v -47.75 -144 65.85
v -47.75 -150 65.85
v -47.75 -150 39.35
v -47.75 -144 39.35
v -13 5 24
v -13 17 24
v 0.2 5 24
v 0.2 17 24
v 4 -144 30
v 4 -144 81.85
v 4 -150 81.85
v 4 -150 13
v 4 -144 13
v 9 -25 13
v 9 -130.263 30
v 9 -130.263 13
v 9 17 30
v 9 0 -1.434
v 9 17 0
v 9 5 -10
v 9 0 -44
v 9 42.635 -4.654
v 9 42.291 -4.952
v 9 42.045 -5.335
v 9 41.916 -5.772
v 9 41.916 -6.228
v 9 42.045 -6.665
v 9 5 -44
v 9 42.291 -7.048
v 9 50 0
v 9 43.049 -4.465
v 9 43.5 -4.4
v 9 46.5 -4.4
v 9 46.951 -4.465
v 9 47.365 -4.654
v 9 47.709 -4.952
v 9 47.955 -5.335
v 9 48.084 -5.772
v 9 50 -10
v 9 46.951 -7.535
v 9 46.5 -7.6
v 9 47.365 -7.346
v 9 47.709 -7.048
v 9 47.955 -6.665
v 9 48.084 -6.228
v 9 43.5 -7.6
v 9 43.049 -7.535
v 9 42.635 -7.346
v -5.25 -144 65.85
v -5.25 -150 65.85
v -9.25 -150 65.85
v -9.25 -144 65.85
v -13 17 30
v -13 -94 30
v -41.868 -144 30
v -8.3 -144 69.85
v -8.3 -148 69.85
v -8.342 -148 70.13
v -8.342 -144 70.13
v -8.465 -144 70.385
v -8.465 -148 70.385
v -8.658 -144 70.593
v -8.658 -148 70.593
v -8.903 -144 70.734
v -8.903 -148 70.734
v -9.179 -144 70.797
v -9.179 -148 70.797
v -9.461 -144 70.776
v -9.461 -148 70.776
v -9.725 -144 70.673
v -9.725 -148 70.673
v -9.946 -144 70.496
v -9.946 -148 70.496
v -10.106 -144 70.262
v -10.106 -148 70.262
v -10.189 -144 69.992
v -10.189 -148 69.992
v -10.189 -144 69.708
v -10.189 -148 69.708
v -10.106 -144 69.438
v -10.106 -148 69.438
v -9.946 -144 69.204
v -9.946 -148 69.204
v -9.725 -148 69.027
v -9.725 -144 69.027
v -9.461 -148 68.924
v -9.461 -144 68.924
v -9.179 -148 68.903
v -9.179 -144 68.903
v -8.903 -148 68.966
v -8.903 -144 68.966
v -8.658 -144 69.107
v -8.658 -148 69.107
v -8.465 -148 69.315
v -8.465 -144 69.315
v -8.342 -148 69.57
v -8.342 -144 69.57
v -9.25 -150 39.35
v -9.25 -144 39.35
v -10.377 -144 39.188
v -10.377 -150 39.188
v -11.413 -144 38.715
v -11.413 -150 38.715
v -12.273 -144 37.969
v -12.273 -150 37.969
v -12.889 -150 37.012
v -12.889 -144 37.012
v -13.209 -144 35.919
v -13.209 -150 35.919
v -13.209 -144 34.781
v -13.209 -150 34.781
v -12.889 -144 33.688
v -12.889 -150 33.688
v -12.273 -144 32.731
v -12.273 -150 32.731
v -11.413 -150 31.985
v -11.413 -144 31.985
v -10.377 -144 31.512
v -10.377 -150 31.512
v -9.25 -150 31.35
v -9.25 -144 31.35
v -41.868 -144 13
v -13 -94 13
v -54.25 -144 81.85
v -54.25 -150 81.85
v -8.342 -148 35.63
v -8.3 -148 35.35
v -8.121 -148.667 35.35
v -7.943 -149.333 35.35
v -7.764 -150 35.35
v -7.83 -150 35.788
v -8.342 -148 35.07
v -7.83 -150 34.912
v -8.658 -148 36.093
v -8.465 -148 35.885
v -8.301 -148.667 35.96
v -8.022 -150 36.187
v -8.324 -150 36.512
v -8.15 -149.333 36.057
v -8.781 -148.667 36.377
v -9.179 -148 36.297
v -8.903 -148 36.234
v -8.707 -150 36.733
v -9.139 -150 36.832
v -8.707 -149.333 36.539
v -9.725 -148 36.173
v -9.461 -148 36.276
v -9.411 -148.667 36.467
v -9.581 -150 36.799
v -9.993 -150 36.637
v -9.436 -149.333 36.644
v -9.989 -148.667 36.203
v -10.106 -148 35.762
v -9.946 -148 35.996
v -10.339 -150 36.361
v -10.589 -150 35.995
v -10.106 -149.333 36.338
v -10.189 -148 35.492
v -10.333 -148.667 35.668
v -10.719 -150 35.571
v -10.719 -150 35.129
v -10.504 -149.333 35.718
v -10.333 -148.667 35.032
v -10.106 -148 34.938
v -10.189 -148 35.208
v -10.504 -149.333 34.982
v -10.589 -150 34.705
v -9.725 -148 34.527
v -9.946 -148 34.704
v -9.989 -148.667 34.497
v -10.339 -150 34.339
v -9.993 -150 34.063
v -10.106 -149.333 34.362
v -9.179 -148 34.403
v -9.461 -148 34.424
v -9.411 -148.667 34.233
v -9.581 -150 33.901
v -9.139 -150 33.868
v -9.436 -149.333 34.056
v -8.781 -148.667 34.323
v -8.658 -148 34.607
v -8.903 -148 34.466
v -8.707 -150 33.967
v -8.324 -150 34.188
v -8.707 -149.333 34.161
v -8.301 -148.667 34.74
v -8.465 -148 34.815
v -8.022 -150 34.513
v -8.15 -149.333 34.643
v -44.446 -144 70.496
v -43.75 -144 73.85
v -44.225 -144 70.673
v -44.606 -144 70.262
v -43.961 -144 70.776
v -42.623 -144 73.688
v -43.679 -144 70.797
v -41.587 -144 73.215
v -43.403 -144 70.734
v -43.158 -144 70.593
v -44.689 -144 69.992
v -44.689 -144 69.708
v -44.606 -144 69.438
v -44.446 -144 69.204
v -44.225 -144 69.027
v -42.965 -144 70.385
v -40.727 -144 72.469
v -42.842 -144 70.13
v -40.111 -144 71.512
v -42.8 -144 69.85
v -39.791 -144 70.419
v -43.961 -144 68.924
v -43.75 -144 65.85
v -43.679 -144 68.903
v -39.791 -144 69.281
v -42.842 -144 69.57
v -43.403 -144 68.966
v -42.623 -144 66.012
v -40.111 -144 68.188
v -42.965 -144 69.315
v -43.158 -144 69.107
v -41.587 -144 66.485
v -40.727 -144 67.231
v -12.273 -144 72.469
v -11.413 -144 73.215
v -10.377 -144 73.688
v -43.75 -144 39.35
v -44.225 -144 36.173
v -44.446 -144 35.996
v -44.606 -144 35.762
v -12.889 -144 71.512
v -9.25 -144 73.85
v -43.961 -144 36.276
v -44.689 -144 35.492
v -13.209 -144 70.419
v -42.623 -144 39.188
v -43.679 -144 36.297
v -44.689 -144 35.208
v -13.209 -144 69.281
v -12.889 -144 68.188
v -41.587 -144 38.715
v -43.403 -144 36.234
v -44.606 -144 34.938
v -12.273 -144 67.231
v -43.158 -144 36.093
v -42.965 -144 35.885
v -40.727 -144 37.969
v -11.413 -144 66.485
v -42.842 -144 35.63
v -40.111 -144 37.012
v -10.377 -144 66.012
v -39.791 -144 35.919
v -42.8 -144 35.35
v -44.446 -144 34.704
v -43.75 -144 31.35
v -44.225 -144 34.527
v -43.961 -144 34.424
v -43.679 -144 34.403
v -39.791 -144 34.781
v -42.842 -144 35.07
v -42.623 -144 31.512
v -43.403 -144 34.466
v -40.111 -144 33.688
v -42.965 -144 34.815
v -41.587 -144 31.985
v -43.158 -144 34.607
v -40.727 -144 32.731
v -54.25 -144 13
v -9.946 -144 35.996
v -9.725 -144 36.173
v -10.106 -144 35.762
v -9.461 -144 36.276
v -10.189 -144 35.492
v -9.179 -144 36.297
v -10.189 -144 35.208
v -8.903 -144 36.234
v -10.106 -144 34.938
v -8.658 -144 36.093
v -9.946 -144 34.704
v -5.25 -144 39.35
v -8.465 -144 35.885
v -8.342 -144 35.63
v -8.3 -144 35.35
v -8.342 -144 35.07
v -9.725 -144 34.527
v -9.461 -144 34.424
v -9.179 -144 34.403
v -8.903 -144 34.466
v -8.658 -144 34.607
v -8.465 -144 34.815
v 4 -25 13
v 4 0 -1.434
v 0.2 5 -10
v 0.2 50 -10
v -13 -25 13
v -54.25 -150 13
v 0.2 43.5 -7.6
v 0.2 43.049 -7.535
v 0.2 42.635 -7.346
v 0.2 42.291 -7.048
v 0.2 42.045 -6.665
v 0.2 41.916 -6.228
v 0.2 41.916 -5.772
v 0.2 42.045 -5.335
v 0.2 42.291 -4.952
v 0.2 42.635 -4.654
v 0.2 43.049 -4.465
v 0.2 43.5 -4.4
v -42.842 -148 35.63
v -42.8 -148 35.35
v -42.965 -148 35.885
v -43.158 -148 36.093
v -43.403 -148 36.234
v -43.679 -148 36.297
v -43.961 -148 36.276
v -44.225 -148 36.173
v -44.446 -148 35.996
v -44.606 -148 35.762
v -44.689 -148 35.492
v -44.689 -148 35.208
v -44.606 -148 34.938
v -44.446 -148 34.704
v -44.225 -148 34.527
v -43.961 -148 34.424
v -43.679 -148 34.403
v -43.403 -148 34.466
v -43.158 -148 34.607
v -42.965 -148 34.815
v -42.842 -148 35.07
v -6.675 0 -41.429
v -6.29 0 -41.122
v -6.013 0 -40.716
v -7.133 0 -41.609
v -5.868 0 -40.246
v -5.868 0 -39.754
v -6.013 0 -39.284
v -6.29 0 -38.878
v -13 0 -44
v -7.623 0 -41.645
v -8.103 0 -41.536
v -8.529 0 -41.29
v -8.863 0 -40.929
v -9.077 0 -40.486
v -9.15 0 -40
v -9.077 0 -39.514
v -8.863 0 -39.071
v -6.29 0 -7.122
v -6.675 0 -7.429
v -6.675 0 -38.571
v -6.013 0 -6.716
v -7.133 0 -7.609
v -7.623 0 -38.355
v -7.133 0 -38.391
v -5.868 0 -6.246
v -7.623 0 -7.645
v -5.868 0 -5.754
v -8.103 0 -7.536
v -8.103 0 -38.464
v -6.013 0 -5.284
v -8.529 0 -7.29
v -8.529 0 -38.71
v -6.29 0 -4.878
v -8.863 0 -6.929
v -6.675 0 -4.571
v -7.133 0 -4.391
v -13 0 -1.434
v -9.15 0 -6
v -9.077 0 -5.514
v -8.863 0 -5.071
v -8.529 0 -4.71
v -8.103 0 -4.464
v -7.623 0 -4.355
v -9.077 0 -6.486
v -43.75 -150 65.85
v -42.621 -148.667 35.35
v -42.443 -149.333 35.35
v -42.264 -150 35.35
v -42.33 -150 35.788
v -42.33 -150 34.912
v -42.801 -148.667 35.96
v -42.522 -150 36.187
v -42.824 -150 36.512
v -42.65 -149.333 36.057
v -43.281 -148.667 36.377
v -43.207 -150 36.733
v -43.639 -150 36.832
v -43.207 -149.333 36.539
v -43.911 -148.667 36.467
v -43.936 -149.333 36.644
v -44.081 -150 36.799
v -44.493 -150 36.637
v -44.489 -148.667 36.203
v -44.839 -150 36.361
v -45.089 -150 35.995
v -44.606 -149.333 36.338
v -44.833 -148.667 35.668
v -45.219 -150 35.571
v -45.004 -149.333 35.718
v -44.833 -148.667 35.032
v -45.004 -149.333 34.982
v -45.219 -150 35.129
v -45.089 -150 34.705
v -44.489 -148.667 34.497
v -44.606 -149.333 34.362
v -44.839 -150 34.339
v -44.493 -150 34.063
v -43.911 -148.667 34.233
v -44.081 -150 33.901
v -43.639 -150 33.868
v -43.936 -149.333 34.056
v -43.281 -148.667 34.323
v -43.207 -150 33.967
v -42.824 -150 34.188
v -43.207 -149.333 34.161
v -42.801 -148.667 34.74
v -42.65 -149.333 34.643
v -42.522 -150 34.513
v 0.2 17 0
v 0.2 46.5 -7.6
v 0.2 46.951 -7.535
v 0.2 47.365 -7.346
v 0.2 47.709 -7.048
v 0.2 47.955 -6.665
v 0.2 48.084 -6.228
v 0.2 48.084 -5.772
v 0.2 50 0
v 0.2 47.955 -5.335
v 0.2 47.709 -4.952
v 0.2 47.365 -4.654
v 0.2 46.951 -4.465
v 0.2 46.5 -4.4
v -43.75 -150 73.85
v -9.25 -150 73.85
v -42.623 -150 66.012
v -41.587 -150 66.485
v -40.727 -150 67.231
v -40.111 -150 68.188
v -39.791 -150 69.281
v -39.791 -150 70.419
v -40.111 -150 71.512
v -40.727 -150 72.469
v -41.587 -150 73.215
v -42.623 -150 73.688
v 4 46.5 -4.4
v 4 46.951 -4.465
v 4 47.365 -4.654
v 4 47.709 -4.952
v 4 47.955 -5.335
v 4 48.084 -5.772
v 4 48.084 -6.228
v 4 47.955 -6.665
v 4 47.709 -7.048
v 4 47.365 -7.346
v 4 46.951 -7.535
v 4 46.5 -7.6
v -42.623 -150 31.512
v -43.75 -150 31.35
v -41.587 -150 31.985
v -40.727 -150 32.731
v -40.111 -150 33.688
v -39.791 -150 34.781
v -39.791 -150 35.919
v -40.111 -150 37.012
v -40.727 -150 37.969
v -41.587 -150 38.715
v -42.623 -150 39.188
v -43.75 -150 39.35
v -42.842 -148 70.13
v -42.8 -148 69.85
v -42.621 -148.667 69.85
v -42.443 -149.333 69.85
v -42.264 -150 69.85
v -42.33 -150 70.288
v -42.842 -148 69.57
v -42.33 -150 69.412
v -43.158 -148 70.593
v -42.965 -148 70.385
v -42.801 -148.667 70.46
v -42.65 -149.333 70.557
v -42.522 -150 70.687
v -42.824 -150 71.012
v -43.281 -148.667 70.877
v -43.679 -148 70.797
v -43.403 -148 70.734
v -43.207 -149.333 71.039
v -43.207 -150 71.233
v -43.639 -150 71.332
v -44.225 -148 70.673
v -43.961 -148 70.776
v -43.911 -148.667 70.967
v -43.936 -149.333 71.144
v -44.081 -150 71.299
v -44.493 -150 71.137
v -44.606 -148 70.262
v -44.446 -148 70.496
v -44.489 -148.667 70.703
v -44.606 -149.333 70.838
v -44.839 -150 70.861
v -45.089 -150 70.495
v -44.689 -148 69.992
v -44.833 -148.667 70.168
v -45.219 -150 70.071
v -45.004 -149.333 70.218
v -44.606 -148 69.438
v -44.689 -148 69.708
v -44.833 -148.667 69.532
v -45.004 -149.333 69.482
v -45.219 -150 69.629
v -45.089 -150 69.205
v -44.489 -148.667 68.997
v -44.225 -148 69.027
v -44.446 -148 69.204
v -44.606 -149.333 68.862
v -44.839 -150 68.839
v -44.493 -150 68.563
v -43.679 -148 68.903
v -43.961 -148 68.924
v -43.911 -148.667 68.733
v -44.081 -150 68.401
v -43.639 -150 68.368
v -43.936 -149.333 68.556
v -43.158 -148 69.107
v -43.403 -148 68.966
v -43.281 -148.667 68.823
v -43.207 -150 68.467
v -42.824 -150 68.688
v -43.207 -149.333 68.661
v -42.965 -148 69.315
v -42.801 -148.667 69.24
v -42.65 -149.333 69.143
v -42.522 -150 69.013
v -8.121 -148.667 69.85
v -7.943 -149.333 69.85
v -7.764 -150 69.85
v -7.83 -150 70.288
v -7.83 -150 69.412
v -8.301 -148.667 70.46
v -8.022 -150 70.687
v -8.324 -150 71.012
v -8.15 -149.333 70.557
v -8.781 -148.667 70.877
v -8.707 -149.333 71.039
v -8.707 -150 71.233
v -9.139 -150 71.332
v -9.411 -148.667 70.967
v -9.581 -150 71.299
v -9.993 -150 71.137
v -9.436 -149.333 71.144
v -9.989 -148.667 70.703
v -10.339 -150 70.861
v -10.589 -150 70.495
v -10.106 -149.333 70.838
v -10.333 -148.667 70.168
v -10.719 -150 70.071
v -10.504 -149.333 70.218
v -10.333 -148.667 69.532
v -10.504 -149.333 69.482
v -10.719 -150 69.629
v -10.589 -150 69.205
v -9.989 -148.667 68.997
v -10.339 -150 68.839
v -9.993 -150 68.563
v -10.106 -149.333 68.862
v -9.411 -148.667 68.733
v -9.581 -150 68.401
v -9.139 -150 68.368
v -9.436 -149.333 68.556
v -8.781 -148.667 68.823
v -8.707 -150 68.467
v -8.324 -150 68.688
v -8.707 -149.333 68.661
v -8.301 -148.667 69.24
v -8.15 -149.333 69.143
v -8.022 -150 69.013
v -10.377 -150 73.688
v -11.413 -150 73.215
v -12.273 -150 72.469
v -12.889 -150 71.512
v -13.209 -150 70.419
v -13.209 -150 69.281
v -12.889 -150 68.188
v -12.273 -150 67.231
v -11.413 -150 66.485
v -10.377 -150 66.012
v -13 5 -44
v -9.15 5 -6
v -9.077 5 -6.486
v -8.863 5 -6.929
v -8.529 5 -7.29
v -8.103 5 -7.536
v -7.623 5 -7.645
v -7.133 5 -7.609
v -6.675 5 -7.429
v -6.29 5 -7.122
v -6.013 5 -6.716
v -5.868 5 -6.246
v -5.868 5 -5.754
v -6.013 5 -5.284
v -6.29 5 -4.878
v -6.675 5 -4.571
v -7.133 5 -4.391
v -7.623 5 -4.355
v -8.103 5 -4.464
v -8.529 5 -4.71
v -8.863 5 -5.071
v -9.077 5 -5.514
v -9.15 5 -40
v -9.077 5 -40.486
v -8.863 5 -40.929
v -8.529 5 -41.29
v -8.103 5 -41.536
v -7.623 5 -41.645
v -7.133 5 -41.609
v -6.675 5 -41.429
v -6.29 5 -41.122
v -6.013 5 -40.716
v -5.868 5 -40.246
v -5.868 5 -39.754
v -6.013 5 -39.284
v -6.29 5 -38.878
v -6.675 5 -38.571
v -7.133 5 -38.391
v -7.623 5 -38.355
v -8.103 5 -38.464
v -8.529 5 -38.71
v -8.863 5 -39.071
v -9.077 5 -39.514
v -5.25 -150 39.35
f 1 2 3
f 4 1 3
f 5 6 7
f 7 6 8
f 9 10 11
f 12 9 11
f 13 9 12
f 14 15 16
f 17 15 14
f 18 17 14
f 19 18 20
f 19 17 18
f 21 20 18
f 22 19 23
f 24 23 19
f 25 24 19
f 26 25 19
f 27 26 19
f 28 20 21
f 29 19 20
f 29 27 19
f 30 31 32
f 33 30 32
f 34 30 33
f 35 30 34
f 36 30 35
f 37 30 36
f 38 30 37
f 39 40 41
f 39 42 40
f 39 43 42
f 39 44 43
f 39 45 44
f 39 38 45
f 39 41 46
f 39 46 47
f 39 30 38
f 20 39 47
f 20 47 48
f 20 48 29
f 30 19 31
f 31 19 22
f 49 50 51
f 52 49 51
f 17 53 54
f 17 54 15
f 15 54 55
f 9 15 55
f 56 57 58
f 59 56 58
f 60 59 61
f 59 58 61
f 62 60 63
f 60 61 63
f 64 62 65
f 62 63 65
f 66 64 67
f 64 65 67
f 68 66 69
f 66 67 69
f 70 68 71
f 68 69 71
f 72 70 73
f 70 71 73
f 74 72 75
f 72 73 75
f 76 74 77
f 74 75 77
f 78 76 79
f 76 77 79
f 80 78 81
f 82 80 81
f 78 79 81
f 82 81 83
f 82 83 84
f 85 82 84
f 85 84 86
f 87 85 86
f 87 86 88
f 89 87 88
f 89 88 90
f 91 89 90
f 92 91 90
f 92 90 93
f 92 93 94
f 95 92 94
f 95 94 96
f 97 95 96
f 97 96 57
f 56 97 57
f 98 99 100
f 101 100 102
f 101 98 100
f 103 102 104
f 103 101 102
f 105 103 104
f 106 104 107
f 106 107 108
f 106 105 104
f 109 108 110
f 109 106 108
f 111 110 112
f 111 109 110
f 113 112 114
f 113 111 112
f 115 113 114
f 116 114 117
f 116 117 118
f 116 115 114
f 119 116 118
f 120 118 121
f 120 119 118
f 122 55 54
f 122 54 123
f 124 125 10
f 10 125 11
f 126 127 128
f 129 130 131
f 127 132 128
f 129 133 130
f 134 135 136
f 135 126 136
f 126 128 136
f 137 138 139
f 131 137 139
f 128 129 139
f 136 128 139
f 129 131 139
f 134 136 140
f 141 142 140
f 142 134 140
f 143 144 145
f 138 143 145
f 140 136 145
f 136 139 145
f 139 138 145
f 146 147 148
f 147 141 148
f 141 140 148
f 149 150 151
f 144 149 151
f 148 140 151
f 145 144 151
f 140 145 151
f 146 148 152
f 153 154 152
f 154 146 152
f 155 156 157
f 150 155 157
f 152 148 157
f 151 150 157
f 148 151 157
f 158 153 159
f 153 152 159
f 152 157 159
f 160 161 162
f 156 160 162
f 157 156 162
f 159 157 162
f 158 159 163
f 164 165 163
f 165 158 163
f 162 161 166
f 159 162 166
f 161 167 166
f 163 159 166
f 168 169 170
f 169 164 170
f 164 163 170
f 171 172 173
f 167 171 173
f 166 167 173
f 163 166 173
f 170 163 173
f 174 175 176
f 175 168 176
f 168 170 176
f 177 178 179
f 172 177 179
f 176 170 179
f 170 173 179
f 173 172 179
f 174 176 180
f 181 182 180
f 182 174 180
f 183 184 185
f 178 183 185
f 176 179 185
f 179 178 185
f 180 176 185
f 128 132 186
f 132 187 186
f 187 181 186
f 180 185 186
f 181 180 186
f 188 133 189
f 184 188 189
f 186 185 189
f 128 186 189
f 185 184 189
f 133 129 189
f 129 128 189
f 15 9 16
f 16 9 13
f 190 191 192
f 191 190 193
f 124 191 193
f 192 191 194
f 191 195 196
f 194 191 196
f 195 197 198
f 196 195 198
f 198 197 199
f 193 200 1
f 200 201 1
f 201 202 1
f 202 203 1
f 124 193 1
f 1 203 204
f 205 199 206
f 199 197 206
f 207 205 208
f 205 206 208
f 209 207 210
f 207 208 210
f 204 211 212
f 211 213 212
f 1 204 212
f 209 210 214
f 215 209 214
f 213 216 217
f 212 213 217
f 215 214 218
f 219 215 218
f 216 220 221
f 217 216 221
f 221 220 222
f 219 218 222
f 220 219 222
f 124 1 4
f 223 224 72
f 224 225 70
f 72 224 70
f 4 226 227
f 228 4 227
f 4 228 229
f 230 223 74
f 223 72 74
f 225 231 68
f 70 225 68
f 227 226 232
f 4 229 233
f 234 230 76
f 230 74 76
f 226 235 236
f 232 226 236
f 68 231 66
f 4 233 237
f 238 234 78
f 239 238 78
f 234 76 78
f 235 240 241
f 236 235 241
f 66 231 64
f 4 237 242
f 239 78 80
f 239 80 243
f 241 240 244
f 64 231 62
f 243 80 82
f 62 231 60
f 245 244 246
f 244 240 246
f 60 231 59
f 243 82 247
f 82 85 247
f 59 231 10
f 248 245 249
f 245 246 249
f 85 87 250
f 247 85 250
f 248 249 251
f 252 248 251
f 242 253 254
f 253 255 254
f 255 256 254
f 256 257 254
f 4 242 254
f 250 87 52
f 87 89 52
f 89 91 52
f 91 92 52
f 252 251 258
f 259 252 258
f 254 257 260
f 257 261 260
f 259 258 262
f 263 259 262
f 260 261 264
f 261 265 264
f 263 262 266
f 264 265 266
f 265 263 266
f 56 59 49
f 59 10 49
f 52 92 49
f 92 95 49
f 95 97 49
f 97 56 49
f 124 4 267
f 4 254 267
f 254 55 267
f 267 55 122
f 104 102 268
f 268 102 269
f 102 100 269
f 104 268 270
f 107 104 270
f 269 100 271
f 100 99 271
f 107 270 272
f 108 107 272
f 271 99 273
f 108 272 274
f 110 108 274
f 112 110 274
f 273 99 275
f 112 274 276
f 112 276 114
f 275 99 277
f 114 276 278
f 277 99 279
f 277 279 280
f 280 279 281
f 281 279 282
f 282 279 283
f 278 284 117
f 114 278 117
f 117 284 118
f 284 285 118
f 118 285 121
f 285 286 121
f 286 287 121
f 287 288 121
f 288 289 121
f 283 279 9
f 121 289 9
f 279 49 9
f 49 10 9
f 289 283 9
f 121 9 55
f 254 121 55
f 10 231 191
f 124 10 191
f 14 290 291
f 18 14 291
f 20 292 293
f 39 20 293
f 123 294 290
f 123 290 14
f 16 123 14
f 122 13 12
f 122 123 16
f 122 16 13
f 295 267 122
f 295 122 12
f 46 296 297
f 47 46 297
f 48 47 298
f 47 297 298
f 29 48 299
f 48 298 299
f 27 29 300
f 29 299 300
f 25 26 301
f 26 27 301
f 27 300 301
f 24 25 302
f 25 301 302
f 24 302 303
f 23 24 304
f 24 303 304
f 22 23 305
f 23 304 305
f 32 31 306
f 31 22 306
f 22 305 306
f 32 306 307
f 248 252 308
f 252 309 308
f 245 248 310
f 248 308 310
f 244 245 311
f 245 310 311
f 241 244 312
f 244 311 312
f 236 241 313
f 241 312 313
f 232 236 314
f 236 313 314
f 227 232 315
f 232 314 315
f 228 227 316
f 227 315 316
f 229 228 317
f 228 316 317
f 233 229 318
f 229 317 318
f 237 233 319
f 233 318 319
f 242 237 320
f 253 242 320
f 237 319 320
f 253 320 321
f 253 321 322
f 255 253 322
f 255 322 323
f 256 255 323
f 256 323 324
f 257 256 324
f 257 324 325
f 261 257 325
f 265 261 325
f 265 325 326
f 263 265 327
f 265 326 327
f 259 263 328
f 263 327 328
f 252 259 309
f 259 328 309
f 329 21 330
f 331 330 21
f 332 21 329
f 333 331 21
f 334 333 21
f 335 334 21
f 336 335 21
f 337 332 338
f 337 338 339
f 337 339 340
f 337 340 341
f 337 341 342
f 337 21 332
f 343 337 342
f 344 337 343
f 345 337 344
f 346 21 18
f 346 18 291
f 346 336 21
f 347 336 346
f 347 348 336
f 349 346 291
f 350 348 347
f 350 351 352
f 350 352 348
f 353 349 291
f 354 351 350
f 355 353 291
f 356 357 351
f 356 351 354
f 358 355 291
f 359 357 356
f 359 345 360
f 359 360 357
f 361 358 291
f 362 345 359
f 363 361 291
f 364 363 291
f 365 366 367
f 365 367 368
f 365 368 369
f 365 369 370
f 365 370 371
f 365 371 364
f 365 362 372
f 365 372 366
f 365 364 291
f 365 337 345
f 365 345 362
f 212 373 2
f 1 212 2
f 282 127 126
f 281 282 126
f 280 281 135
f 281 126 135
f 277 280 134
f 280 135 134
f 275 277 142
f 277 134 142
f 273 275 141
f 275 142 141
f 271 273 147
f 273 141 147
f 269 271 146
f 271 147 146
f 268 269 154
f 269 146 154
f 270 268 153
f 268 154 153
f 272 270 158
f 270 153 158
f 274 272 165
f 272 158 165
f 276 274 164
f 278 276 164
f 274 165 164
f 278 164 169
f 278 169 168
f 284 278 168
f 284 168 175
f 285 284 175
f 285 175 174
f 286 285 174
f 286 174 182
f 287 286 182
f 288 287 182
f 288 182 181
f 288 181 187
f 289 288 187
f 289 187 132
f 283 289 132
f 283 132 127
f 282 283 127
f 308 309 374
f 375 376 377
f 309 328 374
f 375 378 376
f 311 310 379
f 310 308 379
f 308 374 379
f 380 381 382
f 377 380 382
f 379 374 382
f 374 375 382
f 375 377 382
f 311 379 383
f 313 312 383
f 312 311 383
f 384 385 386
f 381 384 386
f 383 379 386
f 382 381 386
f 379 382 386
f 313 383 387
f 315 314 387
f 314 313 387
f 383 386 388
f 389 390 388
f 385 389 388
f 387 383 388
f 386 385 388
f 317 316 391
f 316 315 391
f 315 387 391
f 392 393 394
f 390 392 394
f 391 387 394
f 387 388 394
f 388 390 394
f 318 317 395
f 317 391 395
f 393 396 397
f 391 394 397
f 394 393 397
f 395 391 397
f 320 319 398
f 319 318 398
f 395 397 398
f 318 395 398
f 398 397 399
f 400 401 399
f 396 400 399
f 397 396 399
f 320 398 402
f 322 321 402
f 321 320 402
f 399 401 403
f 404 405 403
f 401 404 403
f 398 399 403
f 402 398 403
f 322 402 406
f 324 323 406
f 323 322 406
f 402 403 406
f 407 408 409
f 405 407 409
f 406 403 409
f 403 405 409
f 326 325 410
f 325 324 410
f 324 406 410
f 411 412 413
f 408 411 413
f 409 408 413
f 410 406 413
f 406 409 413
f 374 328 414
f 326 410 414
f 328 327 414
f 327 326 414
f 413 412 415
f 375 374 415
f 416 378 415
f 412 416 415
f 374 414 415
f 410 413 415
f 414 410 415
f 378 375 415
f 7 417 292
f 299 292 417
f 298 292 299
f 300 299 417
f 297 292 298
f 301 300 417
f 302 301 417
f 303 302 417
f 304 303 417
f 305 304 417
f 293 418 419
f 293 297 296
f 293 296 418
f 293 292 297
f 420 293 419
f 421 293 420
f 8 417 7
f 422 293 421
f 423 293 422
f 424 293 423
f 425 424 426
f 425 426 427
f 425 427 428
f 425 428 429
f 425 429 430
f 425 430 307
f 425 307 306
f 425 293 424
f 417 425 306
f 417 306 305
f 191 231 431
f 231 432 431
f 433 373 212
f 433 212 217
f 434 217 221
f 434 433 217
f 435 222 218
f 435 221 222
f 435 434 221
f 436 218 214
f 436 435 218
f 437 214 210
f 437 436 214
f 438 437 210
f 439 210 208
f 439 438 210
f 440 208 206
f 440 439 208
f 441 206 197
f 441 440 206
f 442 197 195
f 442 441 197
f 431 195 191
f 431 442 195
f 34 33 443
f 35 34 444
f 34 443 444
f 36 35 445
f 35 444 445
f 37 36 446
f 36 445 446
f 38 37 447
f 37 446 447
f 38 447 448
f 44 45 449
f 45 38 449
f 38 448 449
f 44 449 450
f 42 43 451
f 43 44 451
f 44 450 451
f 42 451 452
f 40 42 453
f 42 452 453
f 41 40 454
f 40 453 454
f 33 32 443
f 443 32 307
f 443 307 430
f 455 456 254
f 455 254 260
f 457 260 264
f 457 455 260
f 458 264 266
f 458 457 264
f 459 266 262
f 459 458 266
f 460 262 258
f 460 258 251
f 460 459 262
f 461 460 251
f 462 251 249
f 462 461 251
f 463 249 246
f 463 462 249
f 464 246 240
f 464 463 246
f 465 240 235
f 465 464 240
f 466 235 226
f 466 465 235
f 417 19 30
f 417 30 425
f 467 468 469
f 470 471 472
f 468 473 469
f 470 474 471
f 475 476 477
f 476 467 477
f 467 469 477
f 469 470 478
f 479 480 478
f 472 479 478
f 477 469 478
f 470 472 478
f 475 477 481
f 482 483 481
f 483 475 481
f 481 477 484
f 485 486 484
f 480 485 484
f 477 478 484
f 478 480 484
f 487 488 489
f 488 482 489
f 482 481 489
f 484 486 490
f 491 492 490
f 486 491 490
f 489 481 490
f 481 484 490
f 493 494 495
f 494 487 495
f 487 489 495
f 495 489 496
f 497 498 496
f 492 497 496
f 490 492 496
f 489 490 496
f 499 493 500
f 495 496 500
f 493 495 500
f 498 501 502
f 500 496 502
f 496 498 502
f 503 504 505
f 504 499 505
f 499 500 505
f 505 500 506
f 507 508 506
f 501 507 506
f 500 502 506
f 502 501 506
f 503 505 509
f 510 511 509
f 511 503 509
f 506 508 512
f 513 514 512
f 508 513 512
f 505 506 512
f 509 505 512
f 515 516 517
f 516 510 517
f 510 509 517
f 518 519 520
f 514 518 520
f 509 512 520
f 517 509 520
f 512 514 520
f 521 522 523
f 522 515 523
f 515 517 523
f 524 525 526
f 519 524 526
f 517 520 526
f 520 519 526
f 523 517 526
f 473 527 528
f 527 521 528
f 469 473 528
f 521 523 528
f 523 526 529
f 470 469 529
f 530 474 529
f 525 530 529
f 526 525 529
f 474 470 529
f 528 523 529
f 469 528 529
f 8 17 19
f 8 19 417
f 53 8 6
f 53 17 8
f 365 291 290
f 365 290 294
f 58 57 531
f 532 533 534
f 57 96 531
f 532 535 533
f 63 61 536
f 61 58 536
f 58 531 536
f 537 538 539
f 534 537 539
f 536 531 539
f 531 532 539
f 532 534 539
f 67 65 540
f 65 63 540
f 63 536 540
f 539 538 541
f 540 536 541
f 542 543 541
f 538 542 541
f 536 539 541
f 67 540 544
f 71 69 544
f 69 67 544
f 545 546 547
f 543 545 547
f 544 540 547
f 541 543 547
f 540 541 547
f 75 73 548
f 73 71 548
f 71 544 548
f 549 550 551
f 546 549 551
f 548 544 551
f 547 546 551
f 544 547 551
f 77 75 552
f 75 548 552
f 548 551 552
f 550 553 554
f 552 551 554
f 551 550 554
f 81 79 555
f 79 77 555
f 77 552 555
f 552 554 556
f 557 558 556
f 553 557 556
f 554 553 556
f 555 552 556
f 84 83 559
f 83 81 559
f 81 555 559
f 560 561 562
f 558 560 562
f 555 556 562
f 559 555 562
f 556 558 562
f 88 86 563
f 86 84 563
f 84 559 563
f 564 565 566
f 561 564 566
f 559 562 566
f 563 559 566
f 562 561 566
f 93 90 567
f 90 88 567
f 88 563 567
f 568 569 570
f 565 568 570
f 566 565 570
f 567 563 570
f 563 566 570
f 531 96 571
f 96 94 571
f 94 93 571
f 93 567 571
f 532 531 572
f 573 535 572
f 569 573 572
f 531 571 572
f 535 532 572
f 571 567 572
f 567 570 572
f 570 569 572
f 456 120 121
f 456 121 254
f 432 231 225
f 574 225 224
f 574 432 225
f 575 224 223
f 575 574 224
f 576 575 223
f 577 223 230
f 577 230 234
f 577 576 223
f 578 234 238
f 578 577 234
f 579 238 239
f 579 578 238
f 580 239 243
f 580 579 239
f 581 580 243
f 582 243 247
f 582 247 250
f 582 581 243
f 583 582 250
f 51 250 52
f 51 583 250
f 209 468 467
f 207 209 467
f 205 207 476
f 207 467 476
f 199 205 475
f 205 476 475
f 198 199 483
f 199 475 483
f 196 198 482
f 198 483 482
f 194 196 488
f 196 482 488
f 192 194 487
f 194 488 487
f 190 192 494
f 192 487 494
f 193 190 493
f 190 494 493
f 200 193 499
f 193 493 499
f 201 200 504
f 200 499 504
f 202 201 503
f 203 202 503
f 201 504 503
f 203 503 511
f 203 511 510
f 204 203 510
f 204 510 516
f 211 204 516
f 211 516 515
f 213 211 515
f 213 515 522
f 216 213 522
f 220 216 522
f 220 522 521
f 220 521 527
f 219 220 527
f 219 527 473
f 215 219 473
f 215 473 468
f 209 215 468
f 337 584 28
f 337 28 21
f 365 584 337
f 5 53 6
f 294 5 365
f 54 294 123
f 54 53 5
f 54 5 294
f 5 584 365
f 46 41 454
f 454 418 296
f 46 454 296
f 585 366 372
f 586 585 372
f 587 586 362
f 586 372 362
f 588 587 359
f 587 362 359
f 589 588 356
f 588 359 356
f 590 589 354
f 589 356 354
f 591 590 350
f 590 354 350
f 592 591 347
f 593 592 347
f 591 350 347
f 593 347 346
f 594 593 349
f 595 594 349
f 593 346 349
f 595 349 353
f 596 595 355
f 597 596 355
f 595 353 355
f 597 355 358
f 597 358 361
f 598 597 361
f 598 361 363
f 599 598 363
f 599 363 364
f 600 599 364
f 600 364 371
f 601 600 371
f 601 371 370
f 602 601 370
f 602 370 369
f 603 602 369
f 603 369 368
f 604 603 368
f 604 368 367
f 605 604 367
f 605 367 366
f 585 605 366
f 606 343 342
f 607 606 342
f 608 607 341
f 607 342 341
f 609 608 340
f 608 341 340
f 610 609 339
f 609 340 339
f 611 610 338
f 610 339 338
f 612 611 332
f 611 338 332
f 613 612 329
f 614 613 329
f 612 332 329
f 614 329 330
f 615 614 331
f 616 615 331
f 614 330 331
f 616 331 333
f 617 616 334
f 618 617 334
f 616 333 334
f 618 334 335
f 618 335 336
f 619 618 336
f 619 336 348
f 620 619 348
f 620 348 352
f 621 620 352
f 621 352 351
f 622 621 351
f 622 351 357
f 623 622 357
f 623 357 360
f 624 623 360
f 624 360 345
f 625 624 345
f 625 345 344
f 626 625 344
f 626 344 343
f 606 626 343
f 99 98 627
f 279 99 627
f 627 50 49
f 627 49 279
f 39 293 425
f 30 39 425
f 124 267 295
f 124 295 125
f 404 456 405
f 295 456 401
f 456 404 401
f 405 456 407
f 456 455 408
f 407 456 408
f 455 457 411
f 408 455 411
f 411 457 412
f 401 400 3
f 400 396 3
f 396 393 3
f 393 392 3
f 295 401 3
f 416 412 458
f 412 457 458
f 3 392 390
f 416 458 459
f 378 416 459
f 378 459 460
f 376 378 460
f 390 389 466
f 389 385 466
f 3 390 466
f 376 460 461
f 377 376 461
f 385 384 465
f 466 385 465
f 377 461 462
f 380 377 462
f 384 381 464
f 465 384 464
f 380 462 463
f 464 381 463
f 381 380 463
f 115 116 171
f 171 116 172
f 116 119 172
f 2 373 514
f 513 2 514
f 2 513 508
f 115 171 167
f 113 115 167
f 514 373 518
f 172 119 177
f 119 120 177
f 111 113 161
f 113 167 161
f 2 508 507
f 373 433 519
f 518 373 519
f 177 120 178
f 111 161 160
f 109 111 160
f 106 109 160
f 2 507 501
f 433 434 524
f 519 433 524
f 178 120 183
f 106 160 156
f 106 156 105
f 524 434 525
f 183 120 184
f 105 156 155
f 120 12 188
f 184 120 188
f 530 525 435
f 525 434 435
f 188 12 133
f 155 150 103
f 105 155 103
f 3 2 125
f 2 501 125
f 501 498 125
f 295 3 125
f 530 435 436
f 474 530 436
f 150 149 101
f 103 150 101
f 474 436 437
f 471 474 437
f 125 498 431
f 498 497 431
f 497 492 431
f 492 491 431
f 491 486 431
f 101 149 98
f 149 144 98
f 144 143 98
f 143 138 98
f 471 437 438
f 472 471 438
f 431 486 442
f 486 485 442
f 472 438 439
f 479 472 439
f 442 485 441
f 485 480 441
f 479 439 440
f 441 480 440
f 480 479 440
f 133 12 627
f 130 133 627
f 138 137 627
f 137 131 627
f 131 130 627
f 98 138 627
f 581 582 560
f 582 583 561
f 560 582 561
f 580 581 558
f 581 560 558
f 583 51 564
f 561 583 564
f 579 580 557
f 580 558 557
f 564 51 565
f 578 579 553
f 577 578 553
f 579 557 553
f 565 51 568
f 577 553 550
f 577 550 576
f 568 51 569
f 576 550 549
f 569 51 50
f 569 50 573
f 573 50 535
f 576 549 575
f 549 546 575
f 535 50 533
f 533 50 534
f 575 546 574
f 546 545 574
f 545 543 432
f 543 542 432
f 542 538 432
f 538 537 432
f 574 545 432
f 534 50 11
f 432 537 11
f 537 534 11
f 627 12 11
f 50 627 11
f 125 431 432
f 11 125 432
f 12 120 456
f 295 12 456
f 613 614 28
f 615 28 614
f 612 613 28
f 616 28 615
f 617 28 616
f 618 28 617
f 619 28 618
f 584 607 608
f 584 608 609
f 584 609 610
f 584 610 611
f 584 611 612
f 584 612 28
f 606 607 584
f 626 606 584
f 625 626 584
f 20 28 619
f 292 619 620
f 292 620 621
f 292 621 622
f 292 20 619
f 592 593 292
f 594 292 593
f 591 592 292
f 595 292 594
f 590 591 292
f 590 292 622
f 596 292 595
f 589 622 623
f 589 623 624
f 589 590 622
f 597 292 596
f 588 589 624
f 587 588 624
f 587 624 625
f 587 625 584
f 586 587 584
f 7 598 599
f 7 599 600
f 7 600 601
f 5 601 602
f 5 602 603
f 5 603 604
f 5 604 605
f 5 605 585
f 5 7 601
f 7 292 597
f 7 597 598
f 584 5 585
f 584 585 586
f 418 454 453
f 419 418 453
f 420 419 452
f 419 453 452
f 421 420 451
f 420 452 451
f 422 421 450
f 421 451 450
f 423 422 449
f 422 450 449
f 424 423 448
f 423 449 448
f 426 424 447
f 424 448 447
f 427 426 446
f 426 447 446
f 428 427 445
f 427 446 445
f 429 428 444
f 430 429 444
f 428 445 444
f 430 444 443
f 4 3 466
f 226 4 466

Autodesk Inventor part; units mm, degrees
ref_plane "YZ Plane" through (0, 0, 0) normal (1, 0, 0) x (0, 1, 0)
ref_plane "XZ Plane" through (0, 0, 0) normal (0, 1, 0) x (-1, 0, 0)
ref_plane "XY Plane" through (0, 0, 0) normal (0, 0, 1) x (1, 0, 0)
sketch "Sketch1" plane through (0, 0, 0) normal (0, 1, 0) x (-1, 0, 0)
  line L0 (0, 0) -> (13, 0)
  line L1 (13, 0) -> (13, -44)
  line L2 (13, -44) -> (0, -44)
  line L3 (0, -44) -> (0, 0)
  line L4 (13, 0) -> (13, -6)
  line L5 (13, -6) -> (7.5, -6)
  line L6 (7.5, -6) -> (7.5, -40)
  circle A0 centre (7.5, -6) radius 1.65
  circle A1 centre (7.5, -40) radius 1.65
  dimension "d0" = 13
  dimension "d1" = 44
  dimension "d2" = 6
  dimension "d3" = 5.5
  dimension "d4" = 34
  dimension "d5" = 3.3
  dimension "d6" = 3.3
extrude "Extrusion1" add sketch "Sketch1" along normal blind 5
sketch "Sketch2" plane through (0, 0, 0) normal (1, 0, 0) x (0, 0, -1)
  line L0 (0, 5) -> (44, 5) projected
  line L1 (0, 5) -> (44, 5)
  line L2 (44, 5) -> (44, 50)
  line L3 (44, 50) -> (0, 50)
  line L4 (0, 50) -> (0, 5)
  line L5 (0, 0) -> (44, 0)
  line L6 (44, 0) -> (44, 5)
  line L7 (44, 5) -> (0, 5)
  line L8 (0, 5) -> (0, 0)
  line L9 (0, 50) -> (10, 50)
  line L10 (10, 50) -> (10, 5)
  line L11 (10, 5) -> (0, 5)
  line L12 (0, 5) -> (0, 50)
  dimension "d9" = 44
  dimension "d10" = 45
  dimension "d11" = 10
extrude "Extrusion2" add sketch "Sketch2" along normal blind 4 contours L4 L3 L10 L0 | L0 L6 L5 L8
sketch "Sketch3" plane through (4, 0, 0) normal (1, 0, 0) x (0, 0, -1)
  line L0 (44, 5) -> (10, 5) projected
  line L1 (10, 5) -> (10, 45)
  line L2 (10, 5) -> (10, 50) projected
  line L3 (0, 50) -> (0, 5) projected
  line L4 (0, 45) -> (4.4, 45)
  line L5 (6, 45) -> (6, 46.5)
  line L6 (6, 45) -> (6, 43.5)
  line L7 (4.4, 46.5) -> (4.4, 43.5)
  line L8 (7.6, 46.5) -> (7.6, 43.5)
  arc A0 (5.4432, 45) -> (6, 44.9) centre (6, 46.5) ccw
  arc A1 (6.5568, 45) -> (4.4, 46.5) centre (6, 46.5) ccw
  line L9 (10, 45) -> (6.5568, 45)
  line L10 (5.4432, 45) -> (0, 45)
  arc A2 (6, 45.1) -> (5.4432, 45) centre (6, 43.5) ccw
  arc A3 (4.4, 43.5) -> (7.6, 43.5) centre (6, 43.5) ccw
  point P0 (0, 0)
  dimension "d14" = 40
  dimension "d15" = 6
  dimension "d16" = 1.5
  dimension "d17" = 1.5
extrude "Extrusion3" cut sketch "Sketch3" against normal blind 4 contours L6 A0 A2 L5 | A1 L9 L8 A3 L7 | L8 L9 A1
sketch "Sketch4" plane through (-13, 0, 0) normal (0, 0, 1) x (1, 0, 0)
  line L0 (0, 0) -> (17, 0) projected
  line L1 (17, 0) -> (17, 5) projected
  line L2 (0, 0) -> (17, 0)
  line L3 (17, 0) -> (17, 5)
  line L4 (17, 5) -> (0, 5)
  line L5 (0, 5) -> (0, 0)
  line L6 (13, 50) -> (13, 5) projected
  line L7 (17, 0) -> (13, 0)
  line L8 (13, 0) -> (13, 17)
  line L9 (13, 17) -> (17, 17)
  line L10 (17, 17) -> (17, 0)
  dimension "d22" = 17
extrude "Extrusion4" add sketch "Sketch4" along normal blind 30
sketch "Sketch5" plane through (0, 0, 0) normal (0, -1, 0) x (1, 0, 0)
  line L0 (-13, -44) -> (-13, 30) projected
  line L1 (-13, 30) -> (4, 30)
  line L2 (4, 30) -> (4, 13)
  line L3 (4, 13) -> (-13, 13)
  line L4 (-13, 13) -> (-13, 30)
  point P0 (0, 0)
  dimension "d25" = 17
  dimension "d26" = 17
extrude "Extrusion5" add sketch "Sketch5" along normal blind 150
sketch "Sketch7" plane through (0, -150, 0) normal (0, -1, 0) x (1, 0, 0)
  line L0 (4, 13) -> (-13, 13) projected
  line L1 (0, 30) -> (0, -10) projected
  line L2 (0, 13) -> (0, 30)
  line L3 (0, 30) -> (0, 52.6)
  circle A0 centre (-36, 52.6) radius 9
  line L4 (-36, 52.6) -> (-36, 36.6)
  line L5 (-36, 36.6) -> (-20, 36.6)
  line L6 (-36, 52.6) -> (-36, 68.6)
  line L7 (-36, 68.6) -> (-52, 68.6)
  line L8 (-52, 68.6) -> (-20, 68.6)
  line L9 (-20, 68.6) -> (-20, 36.6)
  line L10 (-20, 36.6) -> (-52, 36.6)
  line L11 (-52, 36.6) -> (-52, 68.6)
  circle A1 centre (-20, 68.6) radius 1.1
  circle A2 centre (-20, 36.6) radius 1.1
  circle A3 centre (-52, 36.6) radius 1.1
  circle A4 centre (-52, 68.6) radius 1.1
  circle A5 centre (-20, 68.6) radius 4
  circle A6 centre (-20, 36.6) radius 4
  line L12 (-52, 65.6) -> (-52, 70.6)
  line L13 (-52, 36.6) -> (-52, 42.6)
  circle A7 centre (-52, 68.6) radius 4
  circle A8 centre (-52, 36.6) radius 4
  point P0 (0, 0)
  point P1 (-20, 64.6)
  point P2 (-20, 40.6)
  dimension "d29" = 22.6
  dimension "d31" = 18
  dimension "d32" = 16
  dimension "d33" = 16
  dimension "d34" = 16
  dimension "d35" = 16
  dimension "d36" = 2.2
  dimension "d37" = 2.2
  dimension "d39" = 2.2
  dimension "d40" = 8
  dimension "d43" = 8
  dimension "d49" = 8
  dimension "d50" = 8
sketch "Sketch14" plane through (0, -150, 0) normal (0, -1, 0) x (1, 0, 0)
  line L0 (4, 13) -> (4, 30) projected
  line L1 (4, 13) -> (4, 52.6)
  line L2 (4, 52.6) -> (-26.5, 52.6)
  line L3 (-26.5, 52.6) -> (-26.5, 35.35)
  line L4 (-26.5, 35.35) -> (-9.25, 35.35)
  line L5 (-26.5, 52.6) -> (-43.75, 52.6)
  line L6 (-43.75, 52.6) -> (-43.75, 69.85)
  line L7 (-43.75, 69.85) -> (-9.25, 69.85)
  line L8 (-9.25, 69.85) -> (-9.25, 35.35)
  line L9 (-9.25, 35.35) -> (-43.75, 35.35)
  line L10 (-43.75, 35.35) -> (-43.75, 69.85)
  circle A0 centre (-43.75, 69.85) radius 0.95
  circle A1 centre (-9.25, 69.85) radius 0.95
  circle A2 centre (-9.25, 35.35) radius 0.95
  circle A3 centre (-43.75, 35.35) radius 0.95
  circle A4 centre (-43.75, 69.85) radius 4
  circle A5 centre (-9.25, 69.85) radius 4
  circle A6 centre (-9.25, 35.35) radius 4
  circle A7 centre (-43.75, 35.35) radius 4
  point P0 (0, 0)
  dimension "d91" = 39.6
  dimension "d92" = 30.5
  dimension "d93" = 17.25
  dimension "d94" = 17.25
  dimension "d95" = 17.25
  dimension "d96" = 17.25
  dimension "d97" = 1.9
  dimension "d98" = 1.9
  dimension "d99" = 1.9
  dimension "d100" = 1.9
  dimension "d101" = 8
  dimension "d102" = 8
  dimension "d103" = 8
  dimension "d104" = 8
extrude "Extrusion14" add sketch "Sketch14" against normal blind 6 contours A5 L7 A1 L8 | L8 A1 L7 A5 | A6 L4 A2 L8 | L8 A2 L4 A6 | A7 L10 A3 L9 | L9 A3 L10 A7 | A4 L7 A0 L6 | L6 A0 L7 A4
sketch "Sketch15" plane through (-9.25, -150, 69.85) normal (0, -1, 0) x (1, 0, 0)
  circle A0 centre (0, 0) radius 4 projected
  line L0 (0, 4) -> (10, 4)
  line L1 (10, 4) -> (10, -4)
  line L2 (10, -4) -> (0, -4)
  line L3 (0, -4) -> (0, 4)
  circle A1 centre (0, -34.5) radius 4 projected
  line L4 (0, -30.5) -> (10, -30.5)
  line L5 (10, -30.5) -> (10, -38.5)
  line L6 (10, -38.5) -> (0, -38.5)
  line L7 (0, -38.5) -> (0, -30.5)
  circle A2 centre (-34.5, -34.5) radius 4 projected
  line L8 (-34.5, -38.5) -> (-44.5, -38.5)
  line L9 (-44.5, -38.5) -> (-44.5, -30.5)
  line L10 (-44.5, -30.5) -> (-34.5, -30.5)
  line L11 (-34.5, -30.5) -> (-34.5, -38.5)
  circle A3 centre (-34.5, 0) radius 4 projected
  line L12 (-34.5, -4) -> (-44.5, -4)
  line L13 (-44.5, -4) -> (-44.5, 4)
  line L14 (-44.5, 4) -> (-34.5, 4)
  line L15 (-34.5, 4) -> (-34.5, -4)
  line L16 (-44.5, 4) -> (-38.5, 4)
  line L17 (-38.5, 4) -> (-38.5, -38.5)
  line L18 (-38.5, -38.5) -> (-44.5, -38.5)
  line L19 (-44.5, -38.5) -> (-44.5, 4)
  line L20 (10, 4) -> (4, 4)
  line L21 (4, 4) -> (4, -38.5)
  line L22 (4, -38.5) -> (10, -38.5)
  line L23 (10, -38.5) -> (10, 4)
  point P0 (9.25, -69.85)
  point P1 (-38.5, -4)
  point P2 (-34.5, 4)
  point P3 (-34.5, -30.5)
  point P4 (-38.5, -30.5)
  point P5 (0, -4)
  point P6 (4, -4)
  point P7 (4, -30.5)
  point P8 (0, -38.5)
  point P9 (10, -4)
  dimension "d107" = 10
  dimension "d108" = 8
  dimension "d109" = 10
  dimension "d110" = 8
  dimension "d111" = 10
  dimension "d112" = 8
  dimension "d113" = 10
  dimension "d114" = 8
  dimension "d115" = 6
  dimension "d116" = 6
extrude "Extrusion15" add sketch "Sketch15" against normal blind 6 contours L21 L2 A0 | A0 L0 L21 | L21 L0 L1 L2 | L2 L23 L4 L21 | L21 A1 L4 | L4 L5 L6 L21 | L21 L6 A1 | A2 L17 L10 | L8 L17 A2 | L17 L8 L9 L10 | L10 L19 L12 L17 | L17 A3 L12 | L12 L13 L14 L17 | L17 L14 A3
sketch "Sketch16" plane through (0, -150, 0) normal (0, -1, 0) x (1, 0, 0)
  line L0 (0.75, 73.85) -> (0.75, 31.35) projected
  line L1 (0.75, 73.85) -> (-51.25, 73.85)
  line L2 (-51.25, 73.85) -> (-51.25, 81.85)
  line L3 (-51.25, 81.85) -> (0.75, 81.85)
  line L4 (0.75, 81.85) -> (0.75, 73.85)
  line L5 (0.75, 31.35) -> (-9.25, 31.35) projected
  line L6 (0.75, 31.35) -> (-51.25, 31.35)
  line L7 (-51.25, 31.35) -> (-51.25, 23.35)
  line L8 (-51.25, 23.35) -> (0.75, 23.35)
  line L9 (0.75, 23.35) -> (0.75, 31.35)
  point P0 (0, 0)
  dimension "d119" = 8
  dimension "d120" = 8
extrude "Extrusion16" add sketch "Sketch16" against normal blind 6
sketch "Sketch17" plane through (0, -144, 0) normal (0, 1, 0) x (1, 0, 0)
  line L0 (0.75, -81.85) -> (0.75, -30) projected
  line L1 (4, -30) -> (0, -30) projected
  line L2 (0.75, -81.85) -> (4, -81.85)
  line L3 (4, -81.85) -> (4, -30)
  line L4 (4, -30) -> (0.75, -30)
  line L5 (0.75, -30) -> (0.75, -81.85)
  line L6 (-51.25, -23.35) -> (-51.25, -81.85) projected
  line L7 (-51.25, -23.35) -> (-13, -23.35)
  line L8 (-13, -23.35) -> (-13, -13)
  line L9 (-13, -13) -> (-51.25, -13)
  line L10 (-51.25, -13) -> (-51.25, -23.35)
  point P0 (0, 0)
  point P1 (0.75, -30)
  point P2 (0.75, -30)
extrude "Extrusion17" add sketch "Sketch17" against normal blind 6
chamfer "Chamfer4" distance 50 angle 30 1 edges at (-13, -144, 21.5) measured on face at (-13, -46.3333, 24.3333)
chamfer "Chamfer5" distance 25 angle 30 1 edges at (-4.5, 0, 13) measured on face at (-1.6667, -81.3333, 13)
sketch "Sketch19" plane through (-13, 0, 30) normal (0, 0, 1) x (1, 0, 0)
  line L0 (13, 17) -> (13, 5) projected
  line L1 (0, 0) -> (0, 5) projected
  line L2 (13, 17) -> (0, 17)
  line L3 (0, 17) -> (0, 5)
  line L4 (0, 5) -> (13, 5)
  line L5 (13, 5) -> (13, 17)
  point P0 (13, 0)
extrude "Extrusion18" add sketch "Sketch19" against normal blind 6
sketch "Sketch20" plane through (-51.25, -150, 13) normal (-1, 0, 0) x (0, 0, 1)
  line L0 (0, 125) -> (0, 0) projected
  line L1 (60.85, 6) -> (68.85, 6) projected
  line L2 (0, 0) -> (68.85, 0)
  line L3 (68.85, 0) -> (68.85, 6)
  line L4 (68.85, 6) -> (0, 6)
  line L5 (0, 6) -> (0, 0)
  point P0 (-13, 150)
extrude "Extrusion19" add sketch "Sketch20" along normal blind 3
sketch "Sketch21" plane through (0, 0, 0) normal (-1, 0, 0) x (0, 0, 1)
  line L0 (-10, 5) -> (-10, 50) projected
  line L1 (24, 5) -> (-10, 5) projected
  line L2 (-10, 50) -> (24, 50)
  line L3 (24, 50) -> (24, 5)
  line L4 (24, 5) -> (-10, 5)
  line L5 (-10, 5) -> (-10, 50)
  point P0 (0, 0)
extrude "Extrusion20" cut sketch "Sketch21" against normal blind 0.2
chamfer "Chamfer6" distance 2 angle 15 1 edges at (-10.2, -150, 69.85) measured on face at (-8.3489, -146, 69.5492)
chamfer "Chamfer7" distance 2 angle 15 1 edges at (-10.2, -150, 35.35) measured on face at (-8.6492, -146, 36.0859)
chamfer "Chamfer8" distance 2 angle 15 1 edges at (-44.7, -150, 35.35) measured on face at (-43.7117, -146, 34.4008)
chamfer "Chamfer9" distance 2 angle 15 1 edges at (-44.7, -150, 69.85) measured on face at (-42.8489, -146, 69.5492)
sketch "Sketch22" plane through (4, 0, 0) normal (1, 0, 0) x (0, 0, -1)
  line L0 (44, 0) -> (1.4338, 0) projected
  line L1 (-30, 17) -> (-30, -144) projected
  line L2 (44, 0) -> (-30, 0)
  line L3 (-30, 0) -> (-30, 17)
  line L4 (-30, 17) -> (44, 17)
  line L5 (44, 17) -> (44, 0)
  line L6 (10, 50) -> (0, 50) projected
  line L7 (10, 50) -> (0, 50)
  line L8 (0, 50) -> (0, 0)
  line L9 (0, 0) -> (10, 0)
  line L10 (10, 0) -> (10, 50)
  line L11 (10, 5) -> (10, 50) projected
  line L12 (44, 17) -> (10, 17)
  line L13 (10, 17) -> (10, 5)
  line L14 (10, 5) -> (44, 5)
  line L15 (44, 5) -> (44, 17)
  arc A0 (4.4, 43.5) -> (7.6, 43.5) centre (6, 43.5) ccw projected
  circle A1 centre (6, 43.5) radius 1.6
  arc A2 (7.6, 46.5) -> (4.4, 46.5) centre (6, 46.5) ccw projected
  circle A3 centre (6, 46.5) radius 1.6
  line L16 (7.6, 46.5) -> (7.6, 43.5) projected
  line L17 (7.6, 46.5) -> (7.6, 43.5)
  line L18 (7.6, 43.5) -> (4.4, 43.5)
  line L19 (4.4, 43.5) -> (4.4, 46.5) projected
  line L20 (4.4, 46.5) -> (4.4, 43.5)
  point P0 (0, 17)
  point P1 (1.4338, 0)
extrude "Extrusion21" add sketch "Sketch22" along normal blind 5 contours L0 L10 L14 L5 | L0 L2 L8 L4 L10 | L2 L1 L4 L8 | L4 L8 L6 L10
sketch "Sketch23" plane through (4, 0, 0) normal (1, 0, 0) x (0, 0, -1)
  line L0 (-13, -25) -> (-13, -94) projected
  line L1 (-13, -25) -> (1.4338, 0) projected
  line L2 (-13, -25) -> (1.4338, 0)
  line L3 (-30, 0) -> (44, 0) projected
  line L4 (1.4338, 0) -> (-30, 0)
  line L5 (-30, 0) -> (-30, -144) projected
  line L6 (-30, 0) -> (-30, -144)
  line L7 (-81.85, -144) -> (-13, -144) projected
  line L8 (-30, -144) -> (-13, -144)
  line L9 (-13, -144) -> (-13, -25)
  point P0 (0, 0)
extrude "Extrusion22" add sketch "Sketch23" along normal blind 5
chamfer "Chamfer10" distance 13.737 angle 20 1 edges at (9, -144, 21.5) measured on face at (9, -50.6667, 24.3333)
properties part number "camera_mount_v2"
